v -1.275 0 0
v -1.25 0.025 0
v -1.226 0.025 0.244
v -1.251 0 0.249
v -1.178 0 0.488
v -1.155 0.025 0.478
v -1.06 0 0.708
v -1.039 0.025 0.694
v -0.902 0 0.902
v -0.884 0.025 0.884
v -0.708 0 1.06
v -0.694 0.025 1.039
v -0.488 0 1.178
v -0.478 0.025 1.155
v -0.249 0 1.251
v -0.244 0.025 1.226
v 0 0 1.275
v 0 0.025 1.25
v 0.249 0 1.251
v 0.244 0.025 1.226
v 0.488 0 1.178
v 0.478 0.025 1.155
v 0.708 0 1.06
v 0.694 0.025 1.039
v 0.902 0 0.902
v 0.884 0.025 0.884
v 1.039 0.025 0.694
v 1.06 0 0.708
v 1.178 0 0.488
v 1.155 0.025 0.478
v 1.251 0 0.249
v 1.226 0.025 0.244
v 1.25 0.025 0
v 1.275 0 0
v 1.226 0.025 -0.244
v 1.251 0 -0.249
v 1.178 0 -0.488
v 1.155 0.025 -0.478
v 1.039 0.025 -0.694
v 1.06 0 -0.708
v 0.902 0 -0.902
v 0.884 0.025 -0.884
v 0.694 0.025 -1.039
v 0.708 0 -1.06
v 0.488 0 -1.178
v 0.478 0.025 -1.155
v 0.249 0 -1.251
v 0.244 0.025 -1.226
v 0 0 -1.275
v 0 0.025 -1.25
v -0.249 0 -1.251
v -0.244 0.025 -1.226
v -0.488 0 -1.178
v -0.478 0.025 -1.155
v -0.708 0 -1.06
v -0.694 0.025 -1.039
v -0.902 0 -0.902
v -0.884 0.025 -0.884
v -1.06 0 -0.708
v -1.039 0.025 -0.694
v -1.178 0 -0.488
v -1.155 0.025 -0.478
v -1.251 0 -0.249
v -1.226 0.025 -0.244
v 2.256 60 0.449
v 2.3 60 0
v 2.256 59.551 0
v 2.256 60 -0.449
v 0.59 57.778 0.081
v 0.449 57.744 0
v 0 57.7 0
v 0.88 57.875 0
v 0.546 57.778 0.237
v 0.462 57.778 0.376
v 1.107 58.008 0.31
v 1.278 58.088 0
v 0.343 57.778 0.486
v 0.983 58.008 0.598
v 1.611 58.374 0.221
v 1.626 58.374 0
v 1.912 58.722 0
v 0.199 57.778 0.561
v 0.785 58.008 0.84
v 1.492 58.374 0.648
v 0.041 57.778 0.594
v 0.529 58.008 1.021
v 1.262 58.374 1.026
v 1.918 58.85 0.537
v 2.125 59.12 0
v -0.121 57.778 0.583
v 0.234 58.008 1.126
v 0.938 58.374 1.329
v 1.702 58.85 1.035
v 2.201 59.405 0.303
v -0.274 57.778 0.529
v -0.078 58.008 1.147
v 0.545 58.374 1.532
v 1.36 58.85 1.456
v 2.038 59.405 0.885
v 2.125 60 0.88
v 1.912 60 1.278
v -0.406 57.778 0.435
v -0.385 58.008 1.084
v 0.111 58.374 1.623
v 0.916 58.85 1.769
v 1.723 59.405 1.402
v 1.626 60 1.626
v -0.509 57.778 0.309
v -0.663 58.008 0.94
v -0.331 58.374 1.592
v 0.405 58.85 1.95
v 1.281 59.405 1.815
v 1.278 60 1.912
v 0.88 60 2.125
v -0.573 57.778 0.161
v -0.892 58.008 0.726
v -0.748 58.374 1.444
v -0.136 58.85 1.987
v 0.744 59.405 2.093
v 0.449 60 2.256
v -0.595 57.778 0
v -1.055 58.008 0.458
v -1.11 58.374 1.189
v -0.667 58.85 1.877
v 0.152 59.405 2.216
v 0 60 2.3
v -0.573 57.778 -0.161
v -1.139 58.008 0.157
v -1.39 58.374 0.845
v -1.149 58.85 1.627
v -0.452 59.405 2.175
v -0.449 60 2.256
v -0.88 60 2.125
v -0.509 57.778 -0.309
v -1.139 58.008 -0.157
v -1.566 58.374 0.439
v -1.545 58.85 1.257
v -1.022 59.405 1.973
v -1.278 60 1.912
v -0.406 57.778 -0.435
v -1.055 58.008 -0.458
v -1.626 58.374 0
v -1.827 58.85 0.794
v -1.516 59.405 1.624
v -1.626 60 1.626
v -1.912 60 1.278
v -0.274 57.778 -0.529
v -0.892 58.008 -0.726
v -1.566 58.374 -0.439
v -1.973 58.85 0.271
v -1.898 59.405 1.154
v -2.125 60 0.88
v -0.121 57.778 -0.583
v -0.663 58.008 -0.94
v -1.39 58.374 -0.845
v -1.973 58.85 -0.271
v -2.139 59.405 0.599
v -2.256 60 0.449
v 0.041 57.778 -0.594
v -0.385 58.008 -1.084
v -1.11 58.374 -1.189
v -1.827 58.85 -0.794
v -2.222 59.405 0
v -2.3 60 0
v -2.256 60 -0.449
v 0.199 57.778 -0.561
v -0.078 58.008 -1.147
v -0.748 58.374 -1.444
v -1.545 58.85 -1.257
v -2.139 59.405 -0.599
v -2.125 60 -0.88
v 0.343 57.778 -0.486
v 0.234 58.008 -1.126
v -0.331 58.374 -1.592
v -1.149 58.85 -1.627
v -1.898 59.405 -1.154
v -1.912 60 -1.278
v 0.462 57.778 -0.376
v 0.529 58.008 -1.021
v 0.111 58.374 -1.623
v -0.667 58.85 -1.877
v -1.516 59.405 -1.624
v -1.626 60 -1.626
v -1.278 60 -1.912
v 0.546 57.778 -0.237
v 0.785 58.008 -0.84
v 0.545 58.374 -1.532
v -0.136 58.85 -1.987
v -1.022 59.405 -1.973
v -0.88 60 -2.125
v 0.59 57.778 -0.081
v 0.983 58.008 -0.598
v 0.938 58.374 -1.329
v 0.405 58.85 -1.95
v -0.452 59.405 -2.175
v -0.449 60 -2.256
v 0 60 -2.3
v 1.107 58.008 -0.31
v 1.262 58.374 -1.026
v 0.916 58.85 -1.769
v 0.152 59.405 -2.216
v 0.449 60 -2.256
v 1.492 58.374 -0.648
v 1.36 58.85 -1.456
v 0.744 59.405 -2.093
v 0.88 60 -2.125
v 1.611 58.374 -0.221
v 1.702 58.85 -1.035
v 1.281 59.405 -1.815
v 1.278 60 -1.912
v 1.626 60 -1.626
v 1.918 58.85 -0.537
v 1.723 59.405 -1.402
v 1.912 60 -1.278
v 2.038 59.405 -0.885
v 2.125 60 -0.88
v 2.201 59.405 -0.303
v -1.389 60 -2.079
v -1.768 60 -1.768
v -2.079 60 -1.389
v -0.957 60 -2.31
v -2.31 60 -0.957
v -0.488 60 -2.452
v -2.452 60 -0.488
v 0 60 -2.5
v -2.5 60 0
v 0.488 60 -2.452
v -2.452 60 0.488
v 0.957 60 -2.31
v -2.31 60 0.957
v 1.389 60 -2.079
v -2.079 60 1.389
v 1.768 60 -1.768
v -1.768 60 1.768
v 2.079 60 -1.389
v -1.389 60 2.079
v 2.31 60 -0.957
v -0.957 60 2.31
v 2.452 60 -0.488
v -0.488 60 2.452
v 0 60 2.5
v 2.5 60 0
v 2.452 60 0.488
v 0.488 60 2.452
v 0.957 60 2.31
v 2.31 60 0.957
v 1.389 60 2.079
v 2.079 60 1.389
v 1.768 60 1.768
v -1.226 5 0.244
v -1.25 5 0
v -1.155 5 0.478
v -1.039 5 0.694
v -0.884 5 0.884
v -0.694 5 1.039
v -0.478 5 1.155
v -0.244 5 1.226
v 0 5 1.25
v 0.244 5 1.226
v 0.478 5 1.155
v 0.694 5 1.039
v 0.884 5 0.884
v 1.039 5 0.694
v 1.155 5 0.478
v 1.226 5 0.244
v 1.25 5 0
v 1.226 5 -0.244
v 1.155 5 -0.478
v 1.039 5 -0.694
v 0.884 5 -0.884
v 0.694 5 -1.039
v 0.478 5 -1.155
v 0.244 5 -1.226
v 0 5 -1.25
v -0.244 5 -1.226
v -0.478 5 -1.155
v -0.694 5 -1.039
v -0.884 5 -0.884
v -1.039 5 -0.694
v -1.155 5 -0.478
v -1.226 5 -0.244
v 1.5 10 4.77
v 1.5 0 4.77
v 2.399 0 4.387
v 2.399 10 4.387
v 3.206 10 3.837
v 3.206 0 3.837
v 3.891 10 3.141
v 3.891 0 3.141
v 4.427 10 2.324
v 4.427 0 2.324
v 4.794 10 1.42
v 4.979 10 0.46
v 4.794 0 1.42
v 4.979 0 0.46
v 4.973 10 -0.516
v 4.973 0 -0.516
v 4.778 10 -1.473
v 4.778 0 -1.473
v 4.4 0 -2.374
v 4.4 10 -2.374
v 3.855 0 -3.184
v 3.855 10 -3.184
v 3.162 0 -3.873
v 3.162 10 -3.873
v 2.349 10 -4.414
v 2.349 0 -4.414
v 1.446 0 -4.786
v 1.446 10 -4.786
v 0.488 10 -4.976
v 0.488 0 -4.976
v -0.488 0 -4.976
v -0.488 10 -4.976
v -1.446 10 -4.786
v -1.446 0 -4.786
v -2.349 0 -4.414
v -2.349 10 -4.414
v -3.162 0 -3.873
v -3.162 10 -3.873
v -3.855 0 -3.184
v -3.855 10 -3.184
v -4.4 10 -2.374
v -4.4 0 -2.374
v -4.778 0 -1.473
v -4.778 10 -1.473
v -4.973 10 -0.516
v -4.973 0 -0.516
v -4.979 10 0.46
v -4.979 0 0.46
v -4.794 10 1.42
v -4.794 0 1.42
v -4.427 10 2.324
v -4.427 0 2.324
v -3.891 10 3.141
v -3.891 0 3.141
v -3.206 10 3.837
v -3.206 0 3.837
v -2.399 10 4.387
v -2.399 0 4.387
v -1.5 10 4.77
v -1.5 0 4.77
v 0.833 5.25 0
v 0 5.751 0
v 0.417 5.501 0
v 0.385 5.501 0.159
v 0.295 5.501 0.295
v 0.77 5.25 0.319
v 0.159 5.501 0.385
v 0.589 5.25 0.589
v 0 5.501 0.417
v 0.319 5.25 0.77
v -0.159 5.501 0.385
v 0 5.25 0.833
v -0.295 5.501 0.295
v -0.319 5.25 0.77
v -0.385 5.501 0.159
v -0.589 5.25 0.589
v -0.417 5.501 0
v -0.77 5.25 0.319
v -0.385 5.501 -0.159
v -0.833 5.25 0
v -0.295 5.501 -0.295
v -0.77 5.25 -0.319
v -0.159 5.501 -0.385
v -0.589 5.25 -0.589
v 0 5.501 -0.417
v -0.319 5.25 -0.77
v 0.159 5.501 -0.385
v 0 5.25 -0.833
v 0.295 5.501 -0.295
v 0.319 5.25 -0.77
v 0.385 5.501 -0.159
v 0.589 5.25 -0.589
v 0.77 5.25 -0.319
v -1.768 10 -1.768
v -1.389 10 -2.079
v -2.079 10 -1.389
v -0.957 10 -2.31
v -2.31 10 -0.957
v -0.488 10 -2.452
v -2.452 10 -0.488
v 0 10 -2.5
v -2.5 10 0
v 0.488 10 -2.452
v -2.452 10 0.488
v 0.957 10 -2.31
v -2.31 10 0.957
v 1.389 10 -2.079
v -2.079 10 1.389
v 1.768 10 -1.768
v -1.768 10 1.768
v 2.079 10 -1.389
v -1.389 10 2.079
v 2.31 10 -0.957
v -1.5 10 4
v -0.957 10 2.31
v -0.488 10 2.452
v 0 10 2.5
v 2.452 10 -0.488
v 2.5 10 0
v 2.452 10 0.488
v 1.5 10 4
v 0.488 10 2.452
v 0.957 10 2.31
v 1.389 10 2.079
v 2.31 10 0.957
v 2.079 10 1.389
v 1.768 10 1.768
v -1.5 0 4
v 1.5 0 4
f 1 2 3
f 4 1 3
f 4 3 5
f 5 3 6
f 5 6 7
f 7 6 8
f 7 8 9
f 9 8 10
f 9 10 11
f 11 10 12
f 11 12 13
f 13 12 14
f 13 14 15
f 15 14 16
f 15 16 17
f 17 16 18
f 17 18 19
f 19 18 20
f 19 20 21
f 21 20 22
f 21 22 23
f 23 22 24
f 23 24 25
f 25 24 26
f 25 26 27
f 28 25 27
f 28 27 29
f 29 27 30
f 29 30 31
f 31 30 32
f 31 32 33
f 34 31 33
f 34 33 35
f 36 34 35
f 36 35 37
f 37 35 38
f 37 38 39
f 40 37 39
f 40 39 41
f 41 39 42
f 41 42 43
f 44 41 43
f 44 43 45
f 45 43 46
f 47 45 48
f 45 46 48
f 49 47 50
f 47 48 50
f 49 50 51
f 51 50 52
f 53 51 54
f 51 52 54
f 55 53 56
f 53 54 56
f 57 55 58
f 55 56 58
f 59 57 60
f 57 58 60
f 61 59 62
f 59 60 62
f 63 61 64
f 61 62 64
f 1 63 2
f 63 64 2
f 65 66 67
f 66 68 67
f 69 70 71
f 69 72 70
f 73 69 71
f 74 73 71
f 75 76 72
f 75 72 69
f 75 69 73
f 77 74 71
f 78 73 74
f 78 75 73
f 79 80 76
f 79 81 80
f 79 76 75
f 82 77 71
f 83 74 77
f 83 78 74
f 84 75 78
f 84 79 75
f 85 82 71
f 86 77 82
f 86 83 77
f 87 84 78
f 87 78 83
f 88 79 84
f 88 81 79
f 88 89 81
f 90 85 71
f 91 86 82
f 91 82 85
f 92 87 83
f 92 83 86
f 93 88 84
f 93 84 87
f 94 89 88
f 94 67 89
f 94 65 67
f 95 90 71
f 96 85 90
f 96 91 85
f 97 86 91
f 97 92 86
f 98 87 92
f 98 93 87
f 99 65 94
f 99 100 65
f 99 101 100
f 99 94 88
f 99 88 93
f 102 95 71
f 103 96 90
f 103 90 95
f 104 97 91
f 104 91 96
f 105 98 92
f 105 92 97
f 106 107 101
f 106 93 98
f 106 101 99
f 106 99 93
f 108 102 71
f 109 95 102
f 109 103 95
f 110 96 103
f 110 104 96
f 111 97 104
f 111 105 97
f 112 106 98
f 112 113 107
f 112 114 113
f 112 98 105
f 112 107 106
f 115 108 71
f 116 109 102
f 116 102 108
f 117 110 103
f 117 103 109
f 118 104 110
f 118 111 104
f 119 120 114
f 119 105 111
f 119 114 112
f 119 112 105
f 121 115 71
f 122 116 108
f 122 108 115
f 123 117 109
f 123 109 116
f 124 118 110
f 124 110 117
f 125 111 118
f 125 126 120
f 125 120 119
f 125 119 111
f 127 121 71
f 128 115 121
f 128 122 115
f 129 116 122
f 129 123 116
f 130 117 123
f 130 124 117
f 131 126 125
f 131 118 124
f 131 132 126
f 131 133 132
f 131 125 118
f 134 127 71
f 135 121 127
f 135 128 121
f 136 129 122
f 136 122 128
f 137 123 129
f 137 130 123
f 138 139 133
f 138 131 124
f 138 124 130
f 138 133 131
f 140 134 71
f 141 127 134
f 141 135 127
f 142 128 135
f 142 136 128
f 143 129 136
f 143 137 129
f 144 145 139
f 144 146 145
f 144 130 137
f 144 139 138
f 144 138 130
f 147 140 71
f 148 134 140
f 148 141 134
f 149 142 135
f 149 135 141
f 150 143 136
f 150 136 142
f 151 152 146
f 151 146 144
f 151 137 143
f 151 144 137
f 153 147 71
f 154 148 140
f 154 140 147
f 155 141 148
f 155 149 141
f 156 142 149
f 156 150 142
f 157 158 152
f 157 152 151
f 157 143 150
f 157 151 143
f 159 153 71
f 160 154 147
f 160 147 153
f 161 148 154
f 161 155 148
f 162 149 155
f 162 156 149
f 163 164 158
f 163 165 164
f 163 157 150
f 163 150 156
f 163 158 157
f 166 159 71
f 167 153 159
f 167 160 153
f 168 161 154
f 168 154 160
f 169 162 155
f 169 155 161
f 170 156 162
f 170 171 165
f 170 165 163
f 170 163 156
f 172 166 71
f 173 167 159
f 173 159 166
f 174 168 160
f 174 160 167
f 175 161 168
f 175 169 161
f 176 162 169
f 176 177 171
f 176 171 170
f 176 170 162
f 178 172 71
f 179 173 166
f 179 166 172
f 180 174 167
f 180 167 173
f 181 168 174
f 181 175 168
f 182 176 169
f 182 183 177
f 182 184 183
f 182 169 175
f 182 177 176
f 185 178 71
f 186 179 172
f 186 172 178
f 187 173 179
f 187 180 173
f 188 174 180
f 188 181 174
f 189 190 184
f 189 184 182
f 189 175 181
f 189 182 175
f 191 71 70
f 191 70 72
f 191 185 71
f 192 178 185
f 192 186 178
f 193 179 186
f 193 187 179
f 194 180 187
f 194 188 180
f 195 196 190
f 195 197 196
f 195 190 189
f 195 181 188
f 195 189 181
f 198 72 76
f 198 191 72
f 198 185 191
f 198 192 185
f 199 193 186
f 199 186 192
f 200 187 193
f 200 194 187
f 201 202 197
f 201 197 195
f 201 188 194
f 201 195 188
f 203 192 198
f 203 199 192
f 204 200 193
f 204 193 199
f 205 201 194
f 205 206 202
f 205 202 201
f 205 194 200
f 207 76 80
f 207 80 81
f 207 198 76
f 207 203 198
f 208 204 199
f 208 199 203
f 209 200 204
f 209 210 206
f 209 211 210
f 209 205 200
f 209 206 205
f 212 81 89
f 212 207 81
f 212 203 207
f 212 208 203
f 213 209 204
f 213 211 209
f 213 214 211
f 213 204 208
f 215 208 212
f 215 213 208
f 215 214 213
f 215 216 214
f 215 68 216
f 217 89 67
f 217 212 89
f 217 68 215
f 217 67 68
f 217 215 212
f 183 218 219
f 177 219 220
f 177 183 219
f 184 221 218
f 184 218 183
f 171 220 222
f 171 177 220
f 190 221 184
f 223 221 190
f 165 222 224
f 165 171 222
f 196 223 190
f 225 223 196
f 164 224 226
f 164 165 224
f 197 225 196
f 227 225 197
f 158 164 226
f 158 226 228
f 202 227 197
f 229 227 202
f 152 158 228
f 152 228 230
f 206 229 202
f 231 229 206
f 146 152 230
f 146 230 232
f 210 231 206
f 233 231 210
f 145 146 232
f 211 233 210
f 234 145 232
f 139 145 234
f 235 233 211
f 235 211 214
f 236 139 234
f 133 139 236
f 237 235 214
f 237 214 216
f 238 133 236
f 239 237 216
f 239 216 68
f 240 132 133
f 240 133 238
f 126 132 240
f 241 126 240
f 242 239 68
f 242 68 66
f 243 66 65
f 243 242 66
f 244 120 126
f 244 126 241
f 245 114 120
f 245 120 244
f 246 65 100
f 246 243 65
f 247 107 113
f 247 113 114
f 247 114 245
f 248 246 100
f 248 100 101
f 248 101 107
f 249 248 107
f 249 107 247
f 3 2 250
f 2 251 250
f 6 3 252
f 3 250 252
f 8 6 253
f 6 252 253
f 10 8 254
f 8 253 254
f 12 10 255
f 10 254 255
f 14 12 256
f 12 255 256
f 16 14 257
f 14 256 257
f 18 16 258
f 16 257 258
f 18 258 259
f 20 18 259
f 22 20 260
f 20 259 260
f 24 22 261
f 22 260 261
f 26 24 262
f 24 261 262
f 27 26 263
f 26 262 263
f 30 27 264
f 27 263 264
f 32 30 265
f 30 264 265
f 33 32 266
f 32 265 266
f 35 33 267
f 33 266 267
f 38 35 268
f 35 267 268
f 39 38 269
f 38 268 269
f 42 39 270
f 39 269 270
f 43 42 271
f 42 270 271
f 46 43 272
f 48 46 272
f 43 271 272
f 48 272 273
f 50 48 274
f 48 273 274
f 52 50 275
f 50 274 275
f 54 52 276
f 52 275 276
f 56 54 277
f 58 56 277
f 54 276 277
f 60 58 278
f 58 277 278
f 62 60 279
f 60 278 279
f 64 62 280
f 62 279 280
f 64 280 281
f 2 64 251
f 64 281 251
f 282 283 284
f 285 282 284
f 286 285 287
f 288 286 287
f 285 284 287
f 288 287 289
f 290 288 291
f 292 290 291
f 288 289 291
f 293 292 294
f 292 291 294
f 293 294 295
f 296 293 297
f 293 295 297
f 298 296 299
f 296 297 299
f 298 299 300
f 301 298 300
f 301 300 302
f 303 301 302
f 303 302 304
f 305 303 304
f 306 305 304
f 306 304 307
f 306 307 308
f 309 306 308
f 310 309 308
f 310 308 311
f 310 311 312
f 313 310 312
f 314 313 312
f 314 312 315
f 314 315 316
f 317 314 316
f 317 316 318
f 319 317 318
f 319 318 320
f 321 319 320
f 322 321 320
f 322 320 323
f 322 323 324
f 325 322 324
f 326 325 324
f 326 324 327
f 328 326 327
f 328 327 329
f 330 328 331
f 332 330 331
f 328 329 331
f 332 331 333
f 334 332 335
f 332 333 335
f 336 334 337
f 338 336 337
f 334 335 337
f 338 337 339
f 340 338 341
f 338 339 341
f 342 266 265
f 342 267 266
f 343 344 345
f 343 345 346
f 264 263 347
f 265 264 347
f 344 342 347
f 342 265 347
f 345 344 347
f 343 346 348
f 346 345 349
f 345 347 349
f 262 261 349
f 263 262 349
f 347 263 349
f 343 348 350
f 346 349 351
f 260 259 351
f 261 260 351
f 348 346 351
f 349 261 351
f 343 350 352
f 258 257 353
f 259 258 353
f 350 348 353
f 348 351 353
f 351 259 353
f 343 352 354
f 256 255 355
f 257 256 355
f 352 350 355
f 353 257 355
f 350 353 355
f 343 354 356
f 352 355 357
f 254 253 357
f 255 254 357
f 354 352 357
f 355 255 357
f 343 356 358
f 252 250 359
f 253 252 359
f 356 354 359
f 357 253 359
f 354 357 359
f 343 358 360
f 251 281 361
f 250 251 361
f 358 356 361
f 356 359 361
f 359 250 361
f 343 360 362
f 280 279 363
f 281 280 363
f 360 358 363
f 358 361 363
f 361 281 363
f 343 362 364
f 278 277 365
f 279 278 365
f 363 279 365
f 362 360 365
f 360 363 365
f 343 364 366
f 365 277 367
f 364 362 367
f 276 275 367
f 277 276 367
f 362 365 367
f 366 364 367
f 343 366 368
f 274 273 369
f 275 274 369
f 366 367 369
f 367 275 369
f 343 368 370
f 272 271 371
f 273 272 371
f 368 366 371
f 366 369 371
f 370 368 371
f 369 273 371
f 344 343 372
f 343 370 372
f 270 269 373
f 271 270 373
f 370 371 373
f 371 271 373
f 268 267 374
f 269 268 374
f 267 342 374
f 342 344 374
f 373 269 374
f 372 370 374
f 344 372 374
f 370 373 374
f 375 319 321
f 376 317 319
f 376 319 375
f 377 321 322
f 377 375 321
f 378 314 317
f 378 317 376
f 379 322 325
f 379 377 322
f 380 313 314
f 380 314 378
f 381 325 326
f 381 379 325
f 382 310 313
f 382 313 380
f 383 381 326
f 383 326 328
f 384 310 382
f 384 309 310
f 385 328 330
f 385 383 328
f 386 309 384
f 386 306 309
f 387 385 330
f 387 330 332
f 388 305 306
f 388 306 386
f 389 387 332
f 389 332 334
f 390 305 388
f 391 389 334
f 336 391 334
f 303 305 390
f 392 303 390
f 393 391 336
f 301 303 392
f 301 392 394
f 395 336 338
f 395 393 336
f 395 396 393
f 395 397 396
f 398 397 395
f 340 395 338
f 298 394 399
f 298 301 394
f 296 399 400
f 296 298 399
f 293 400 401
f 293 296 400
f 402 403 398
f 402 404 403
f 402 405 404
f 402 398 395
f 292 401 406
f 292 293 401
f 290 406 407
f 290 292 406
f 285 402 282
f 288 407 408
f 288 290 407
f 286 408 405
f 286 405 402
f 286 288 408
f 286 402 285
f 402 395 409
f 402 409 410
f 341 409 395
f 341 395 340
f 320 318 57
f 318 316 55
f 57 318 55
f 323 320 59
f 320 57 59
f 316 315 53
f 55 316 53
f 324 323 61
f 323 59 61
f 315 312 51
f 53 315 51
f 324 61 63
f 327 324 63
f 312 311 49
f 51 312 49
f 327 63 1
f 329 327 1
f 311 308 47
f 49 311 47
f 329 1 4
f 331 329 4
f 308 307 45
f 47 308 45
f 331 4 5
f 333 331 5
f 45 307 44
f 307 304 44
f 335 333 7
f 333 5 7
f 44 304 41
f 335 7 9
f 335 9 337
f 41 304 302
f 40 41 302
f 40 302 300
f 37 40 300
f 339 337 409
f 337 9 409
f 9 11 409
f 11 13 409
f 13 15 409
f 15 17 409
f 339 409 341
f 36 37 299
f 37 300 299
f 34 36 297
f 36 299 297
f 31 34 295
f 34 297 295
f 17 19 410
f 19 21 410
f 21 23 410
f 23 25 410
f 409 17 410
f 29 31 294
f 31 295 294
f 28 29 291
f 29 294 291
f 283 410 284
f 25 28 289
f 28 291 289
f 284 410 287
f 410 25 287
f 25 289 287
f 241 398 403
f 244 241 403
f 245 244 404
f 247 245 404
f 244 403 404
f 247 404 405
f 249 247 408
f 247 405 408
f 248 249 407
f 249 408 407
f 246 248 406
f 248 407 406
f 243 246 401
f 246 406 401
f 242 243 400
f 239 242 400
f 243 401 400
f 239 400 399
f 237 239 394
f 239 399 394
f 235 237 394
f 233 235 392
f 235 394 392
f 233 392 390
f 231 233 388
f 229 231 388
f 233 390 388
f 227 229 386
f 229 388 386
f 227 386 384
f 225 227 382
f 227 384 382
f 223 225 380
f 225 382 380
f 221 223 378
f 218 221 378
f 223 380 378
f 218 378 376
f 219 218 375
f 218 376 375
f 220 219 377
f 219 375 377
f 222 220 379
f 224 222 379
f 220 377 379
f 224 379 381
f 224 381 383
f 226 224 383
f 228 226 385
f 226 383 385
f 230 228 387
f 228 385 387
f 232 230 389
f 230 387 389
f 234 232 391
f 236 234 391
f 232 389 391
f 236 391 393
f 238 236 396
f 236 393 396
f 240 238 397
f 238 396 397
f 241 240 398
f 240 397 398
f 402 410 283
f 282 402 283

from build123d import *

# Parameters (mm, degrees)
SKETCH1_R                             = 5
BOSS_EXTRUDE1_DEPTH                   = 10
SKETCH2_R                             = 2.5
BOSS_EXTRUDE2_DEPTH                   = 50
SKETCH9_W                             = 3
SKETCH9_H                             = 1.420897346
CUT_EXTRUDE2_DEPTH                    = 10
TAP_DRILL_FOR_M3X0_5_TAP2_D           = 2.5
TAP_DRILL_FOR_M3X0_5_TAP2_DEPTH       = 5
TAP_DRILL_FOR_M3X0_5_TAP2_CSINK_D     = 2.55
TAP_DRILL_FOR_M3X0_5_TAP2_CSINK_ANGLE = 90
TAP_DRILL_FOR_M3X0_5_TAP2_TIP         = 0.751075774


with BuildPart() as part:
    # Sketch1 → Boss-Extrude1 (new body)
    with BuildSketch(Plane(origin=(0, 0, 0), x_dir=(1, 0, 0), z_dir=(0, 1, 0))):
        with Locations(Location((0, 0, 0), (0, 0, 270))):
            Circle(SKETCH1_R)
    extrude(amount=BOSS_EXTRUDE1_DEPTH)

    # Sketch2 → Boss-Extrude2 (add)
    with BuildSketch(Plane(origin=(0, 10, 0), x_dir=(1, 0, 0), z_dir=(0, 1, 0))):
        with Locations(Location((0, 0, 0), (0, 0, 270))):
            Circle(SKETCH2_R)
    extrude(amount=BOSS_EXTRUDE2_DEPTH)

    # Sketch7 → Cut-Revolve1 (revolve, cut)
    with BuildSketch(Plane.XY):
        with BuildLine():
            Line((2.3, 60), (0, 60))
            Line((0, 60), (0, 57.7))
            ThreePointArc((0, 57.7), (1.626345597, 58.373654403), (2.3, 60))
        make_face()
    revolve(axis=Axis((0, 60, 0), (0, -1, 0)), mode=Mode.SUBTRACT)

    # Sketch9 → Cut-Extrude2 (cut)
    with BuildSketch(Plane.XZ):
        with Locations((0, 4.710448673)):
            Rectangle(SKETCH9_W, SKETCH9_H)
    extrude(amount=-CUT_EXTRUDE2_DEPTH, mode=Mode.SUBTRACT)

    # Tap Drill for M3x0.5 Tap2
    with Locations(Plane.XZ):
        with Locations((0, 0)):
            CounterSinkHole(TAP_DRILL_FOR_M3X0_5_TAP2_D / 2, TAP_DRILL_FOR_M3X0_5_TAP2_CSINK_D / 2, depth=TAP_DRILL_FOR_M3X0_5_TAP2_DEPTH, counter_sink_angle=TAP_DRILL_FOR_M3X0_5_TAP2_CSINK_ANGLE)
            with Locations((0, 0, -(TAP_DRILL_FOR_M3X0_5_TAP2_DEPTH + TAP_DRILL_FOR_M3X0_5_TAP2_TIP / 2))):  # 118° drill point
                Cone(0, TAP_DRILL_FOR_M3X0_5_TAP2_D / 2, TAP_DRILL_FOR_M3X0_5_TAP2_TIP, mode=Mode.SUBTRACT)


solid = part.part
